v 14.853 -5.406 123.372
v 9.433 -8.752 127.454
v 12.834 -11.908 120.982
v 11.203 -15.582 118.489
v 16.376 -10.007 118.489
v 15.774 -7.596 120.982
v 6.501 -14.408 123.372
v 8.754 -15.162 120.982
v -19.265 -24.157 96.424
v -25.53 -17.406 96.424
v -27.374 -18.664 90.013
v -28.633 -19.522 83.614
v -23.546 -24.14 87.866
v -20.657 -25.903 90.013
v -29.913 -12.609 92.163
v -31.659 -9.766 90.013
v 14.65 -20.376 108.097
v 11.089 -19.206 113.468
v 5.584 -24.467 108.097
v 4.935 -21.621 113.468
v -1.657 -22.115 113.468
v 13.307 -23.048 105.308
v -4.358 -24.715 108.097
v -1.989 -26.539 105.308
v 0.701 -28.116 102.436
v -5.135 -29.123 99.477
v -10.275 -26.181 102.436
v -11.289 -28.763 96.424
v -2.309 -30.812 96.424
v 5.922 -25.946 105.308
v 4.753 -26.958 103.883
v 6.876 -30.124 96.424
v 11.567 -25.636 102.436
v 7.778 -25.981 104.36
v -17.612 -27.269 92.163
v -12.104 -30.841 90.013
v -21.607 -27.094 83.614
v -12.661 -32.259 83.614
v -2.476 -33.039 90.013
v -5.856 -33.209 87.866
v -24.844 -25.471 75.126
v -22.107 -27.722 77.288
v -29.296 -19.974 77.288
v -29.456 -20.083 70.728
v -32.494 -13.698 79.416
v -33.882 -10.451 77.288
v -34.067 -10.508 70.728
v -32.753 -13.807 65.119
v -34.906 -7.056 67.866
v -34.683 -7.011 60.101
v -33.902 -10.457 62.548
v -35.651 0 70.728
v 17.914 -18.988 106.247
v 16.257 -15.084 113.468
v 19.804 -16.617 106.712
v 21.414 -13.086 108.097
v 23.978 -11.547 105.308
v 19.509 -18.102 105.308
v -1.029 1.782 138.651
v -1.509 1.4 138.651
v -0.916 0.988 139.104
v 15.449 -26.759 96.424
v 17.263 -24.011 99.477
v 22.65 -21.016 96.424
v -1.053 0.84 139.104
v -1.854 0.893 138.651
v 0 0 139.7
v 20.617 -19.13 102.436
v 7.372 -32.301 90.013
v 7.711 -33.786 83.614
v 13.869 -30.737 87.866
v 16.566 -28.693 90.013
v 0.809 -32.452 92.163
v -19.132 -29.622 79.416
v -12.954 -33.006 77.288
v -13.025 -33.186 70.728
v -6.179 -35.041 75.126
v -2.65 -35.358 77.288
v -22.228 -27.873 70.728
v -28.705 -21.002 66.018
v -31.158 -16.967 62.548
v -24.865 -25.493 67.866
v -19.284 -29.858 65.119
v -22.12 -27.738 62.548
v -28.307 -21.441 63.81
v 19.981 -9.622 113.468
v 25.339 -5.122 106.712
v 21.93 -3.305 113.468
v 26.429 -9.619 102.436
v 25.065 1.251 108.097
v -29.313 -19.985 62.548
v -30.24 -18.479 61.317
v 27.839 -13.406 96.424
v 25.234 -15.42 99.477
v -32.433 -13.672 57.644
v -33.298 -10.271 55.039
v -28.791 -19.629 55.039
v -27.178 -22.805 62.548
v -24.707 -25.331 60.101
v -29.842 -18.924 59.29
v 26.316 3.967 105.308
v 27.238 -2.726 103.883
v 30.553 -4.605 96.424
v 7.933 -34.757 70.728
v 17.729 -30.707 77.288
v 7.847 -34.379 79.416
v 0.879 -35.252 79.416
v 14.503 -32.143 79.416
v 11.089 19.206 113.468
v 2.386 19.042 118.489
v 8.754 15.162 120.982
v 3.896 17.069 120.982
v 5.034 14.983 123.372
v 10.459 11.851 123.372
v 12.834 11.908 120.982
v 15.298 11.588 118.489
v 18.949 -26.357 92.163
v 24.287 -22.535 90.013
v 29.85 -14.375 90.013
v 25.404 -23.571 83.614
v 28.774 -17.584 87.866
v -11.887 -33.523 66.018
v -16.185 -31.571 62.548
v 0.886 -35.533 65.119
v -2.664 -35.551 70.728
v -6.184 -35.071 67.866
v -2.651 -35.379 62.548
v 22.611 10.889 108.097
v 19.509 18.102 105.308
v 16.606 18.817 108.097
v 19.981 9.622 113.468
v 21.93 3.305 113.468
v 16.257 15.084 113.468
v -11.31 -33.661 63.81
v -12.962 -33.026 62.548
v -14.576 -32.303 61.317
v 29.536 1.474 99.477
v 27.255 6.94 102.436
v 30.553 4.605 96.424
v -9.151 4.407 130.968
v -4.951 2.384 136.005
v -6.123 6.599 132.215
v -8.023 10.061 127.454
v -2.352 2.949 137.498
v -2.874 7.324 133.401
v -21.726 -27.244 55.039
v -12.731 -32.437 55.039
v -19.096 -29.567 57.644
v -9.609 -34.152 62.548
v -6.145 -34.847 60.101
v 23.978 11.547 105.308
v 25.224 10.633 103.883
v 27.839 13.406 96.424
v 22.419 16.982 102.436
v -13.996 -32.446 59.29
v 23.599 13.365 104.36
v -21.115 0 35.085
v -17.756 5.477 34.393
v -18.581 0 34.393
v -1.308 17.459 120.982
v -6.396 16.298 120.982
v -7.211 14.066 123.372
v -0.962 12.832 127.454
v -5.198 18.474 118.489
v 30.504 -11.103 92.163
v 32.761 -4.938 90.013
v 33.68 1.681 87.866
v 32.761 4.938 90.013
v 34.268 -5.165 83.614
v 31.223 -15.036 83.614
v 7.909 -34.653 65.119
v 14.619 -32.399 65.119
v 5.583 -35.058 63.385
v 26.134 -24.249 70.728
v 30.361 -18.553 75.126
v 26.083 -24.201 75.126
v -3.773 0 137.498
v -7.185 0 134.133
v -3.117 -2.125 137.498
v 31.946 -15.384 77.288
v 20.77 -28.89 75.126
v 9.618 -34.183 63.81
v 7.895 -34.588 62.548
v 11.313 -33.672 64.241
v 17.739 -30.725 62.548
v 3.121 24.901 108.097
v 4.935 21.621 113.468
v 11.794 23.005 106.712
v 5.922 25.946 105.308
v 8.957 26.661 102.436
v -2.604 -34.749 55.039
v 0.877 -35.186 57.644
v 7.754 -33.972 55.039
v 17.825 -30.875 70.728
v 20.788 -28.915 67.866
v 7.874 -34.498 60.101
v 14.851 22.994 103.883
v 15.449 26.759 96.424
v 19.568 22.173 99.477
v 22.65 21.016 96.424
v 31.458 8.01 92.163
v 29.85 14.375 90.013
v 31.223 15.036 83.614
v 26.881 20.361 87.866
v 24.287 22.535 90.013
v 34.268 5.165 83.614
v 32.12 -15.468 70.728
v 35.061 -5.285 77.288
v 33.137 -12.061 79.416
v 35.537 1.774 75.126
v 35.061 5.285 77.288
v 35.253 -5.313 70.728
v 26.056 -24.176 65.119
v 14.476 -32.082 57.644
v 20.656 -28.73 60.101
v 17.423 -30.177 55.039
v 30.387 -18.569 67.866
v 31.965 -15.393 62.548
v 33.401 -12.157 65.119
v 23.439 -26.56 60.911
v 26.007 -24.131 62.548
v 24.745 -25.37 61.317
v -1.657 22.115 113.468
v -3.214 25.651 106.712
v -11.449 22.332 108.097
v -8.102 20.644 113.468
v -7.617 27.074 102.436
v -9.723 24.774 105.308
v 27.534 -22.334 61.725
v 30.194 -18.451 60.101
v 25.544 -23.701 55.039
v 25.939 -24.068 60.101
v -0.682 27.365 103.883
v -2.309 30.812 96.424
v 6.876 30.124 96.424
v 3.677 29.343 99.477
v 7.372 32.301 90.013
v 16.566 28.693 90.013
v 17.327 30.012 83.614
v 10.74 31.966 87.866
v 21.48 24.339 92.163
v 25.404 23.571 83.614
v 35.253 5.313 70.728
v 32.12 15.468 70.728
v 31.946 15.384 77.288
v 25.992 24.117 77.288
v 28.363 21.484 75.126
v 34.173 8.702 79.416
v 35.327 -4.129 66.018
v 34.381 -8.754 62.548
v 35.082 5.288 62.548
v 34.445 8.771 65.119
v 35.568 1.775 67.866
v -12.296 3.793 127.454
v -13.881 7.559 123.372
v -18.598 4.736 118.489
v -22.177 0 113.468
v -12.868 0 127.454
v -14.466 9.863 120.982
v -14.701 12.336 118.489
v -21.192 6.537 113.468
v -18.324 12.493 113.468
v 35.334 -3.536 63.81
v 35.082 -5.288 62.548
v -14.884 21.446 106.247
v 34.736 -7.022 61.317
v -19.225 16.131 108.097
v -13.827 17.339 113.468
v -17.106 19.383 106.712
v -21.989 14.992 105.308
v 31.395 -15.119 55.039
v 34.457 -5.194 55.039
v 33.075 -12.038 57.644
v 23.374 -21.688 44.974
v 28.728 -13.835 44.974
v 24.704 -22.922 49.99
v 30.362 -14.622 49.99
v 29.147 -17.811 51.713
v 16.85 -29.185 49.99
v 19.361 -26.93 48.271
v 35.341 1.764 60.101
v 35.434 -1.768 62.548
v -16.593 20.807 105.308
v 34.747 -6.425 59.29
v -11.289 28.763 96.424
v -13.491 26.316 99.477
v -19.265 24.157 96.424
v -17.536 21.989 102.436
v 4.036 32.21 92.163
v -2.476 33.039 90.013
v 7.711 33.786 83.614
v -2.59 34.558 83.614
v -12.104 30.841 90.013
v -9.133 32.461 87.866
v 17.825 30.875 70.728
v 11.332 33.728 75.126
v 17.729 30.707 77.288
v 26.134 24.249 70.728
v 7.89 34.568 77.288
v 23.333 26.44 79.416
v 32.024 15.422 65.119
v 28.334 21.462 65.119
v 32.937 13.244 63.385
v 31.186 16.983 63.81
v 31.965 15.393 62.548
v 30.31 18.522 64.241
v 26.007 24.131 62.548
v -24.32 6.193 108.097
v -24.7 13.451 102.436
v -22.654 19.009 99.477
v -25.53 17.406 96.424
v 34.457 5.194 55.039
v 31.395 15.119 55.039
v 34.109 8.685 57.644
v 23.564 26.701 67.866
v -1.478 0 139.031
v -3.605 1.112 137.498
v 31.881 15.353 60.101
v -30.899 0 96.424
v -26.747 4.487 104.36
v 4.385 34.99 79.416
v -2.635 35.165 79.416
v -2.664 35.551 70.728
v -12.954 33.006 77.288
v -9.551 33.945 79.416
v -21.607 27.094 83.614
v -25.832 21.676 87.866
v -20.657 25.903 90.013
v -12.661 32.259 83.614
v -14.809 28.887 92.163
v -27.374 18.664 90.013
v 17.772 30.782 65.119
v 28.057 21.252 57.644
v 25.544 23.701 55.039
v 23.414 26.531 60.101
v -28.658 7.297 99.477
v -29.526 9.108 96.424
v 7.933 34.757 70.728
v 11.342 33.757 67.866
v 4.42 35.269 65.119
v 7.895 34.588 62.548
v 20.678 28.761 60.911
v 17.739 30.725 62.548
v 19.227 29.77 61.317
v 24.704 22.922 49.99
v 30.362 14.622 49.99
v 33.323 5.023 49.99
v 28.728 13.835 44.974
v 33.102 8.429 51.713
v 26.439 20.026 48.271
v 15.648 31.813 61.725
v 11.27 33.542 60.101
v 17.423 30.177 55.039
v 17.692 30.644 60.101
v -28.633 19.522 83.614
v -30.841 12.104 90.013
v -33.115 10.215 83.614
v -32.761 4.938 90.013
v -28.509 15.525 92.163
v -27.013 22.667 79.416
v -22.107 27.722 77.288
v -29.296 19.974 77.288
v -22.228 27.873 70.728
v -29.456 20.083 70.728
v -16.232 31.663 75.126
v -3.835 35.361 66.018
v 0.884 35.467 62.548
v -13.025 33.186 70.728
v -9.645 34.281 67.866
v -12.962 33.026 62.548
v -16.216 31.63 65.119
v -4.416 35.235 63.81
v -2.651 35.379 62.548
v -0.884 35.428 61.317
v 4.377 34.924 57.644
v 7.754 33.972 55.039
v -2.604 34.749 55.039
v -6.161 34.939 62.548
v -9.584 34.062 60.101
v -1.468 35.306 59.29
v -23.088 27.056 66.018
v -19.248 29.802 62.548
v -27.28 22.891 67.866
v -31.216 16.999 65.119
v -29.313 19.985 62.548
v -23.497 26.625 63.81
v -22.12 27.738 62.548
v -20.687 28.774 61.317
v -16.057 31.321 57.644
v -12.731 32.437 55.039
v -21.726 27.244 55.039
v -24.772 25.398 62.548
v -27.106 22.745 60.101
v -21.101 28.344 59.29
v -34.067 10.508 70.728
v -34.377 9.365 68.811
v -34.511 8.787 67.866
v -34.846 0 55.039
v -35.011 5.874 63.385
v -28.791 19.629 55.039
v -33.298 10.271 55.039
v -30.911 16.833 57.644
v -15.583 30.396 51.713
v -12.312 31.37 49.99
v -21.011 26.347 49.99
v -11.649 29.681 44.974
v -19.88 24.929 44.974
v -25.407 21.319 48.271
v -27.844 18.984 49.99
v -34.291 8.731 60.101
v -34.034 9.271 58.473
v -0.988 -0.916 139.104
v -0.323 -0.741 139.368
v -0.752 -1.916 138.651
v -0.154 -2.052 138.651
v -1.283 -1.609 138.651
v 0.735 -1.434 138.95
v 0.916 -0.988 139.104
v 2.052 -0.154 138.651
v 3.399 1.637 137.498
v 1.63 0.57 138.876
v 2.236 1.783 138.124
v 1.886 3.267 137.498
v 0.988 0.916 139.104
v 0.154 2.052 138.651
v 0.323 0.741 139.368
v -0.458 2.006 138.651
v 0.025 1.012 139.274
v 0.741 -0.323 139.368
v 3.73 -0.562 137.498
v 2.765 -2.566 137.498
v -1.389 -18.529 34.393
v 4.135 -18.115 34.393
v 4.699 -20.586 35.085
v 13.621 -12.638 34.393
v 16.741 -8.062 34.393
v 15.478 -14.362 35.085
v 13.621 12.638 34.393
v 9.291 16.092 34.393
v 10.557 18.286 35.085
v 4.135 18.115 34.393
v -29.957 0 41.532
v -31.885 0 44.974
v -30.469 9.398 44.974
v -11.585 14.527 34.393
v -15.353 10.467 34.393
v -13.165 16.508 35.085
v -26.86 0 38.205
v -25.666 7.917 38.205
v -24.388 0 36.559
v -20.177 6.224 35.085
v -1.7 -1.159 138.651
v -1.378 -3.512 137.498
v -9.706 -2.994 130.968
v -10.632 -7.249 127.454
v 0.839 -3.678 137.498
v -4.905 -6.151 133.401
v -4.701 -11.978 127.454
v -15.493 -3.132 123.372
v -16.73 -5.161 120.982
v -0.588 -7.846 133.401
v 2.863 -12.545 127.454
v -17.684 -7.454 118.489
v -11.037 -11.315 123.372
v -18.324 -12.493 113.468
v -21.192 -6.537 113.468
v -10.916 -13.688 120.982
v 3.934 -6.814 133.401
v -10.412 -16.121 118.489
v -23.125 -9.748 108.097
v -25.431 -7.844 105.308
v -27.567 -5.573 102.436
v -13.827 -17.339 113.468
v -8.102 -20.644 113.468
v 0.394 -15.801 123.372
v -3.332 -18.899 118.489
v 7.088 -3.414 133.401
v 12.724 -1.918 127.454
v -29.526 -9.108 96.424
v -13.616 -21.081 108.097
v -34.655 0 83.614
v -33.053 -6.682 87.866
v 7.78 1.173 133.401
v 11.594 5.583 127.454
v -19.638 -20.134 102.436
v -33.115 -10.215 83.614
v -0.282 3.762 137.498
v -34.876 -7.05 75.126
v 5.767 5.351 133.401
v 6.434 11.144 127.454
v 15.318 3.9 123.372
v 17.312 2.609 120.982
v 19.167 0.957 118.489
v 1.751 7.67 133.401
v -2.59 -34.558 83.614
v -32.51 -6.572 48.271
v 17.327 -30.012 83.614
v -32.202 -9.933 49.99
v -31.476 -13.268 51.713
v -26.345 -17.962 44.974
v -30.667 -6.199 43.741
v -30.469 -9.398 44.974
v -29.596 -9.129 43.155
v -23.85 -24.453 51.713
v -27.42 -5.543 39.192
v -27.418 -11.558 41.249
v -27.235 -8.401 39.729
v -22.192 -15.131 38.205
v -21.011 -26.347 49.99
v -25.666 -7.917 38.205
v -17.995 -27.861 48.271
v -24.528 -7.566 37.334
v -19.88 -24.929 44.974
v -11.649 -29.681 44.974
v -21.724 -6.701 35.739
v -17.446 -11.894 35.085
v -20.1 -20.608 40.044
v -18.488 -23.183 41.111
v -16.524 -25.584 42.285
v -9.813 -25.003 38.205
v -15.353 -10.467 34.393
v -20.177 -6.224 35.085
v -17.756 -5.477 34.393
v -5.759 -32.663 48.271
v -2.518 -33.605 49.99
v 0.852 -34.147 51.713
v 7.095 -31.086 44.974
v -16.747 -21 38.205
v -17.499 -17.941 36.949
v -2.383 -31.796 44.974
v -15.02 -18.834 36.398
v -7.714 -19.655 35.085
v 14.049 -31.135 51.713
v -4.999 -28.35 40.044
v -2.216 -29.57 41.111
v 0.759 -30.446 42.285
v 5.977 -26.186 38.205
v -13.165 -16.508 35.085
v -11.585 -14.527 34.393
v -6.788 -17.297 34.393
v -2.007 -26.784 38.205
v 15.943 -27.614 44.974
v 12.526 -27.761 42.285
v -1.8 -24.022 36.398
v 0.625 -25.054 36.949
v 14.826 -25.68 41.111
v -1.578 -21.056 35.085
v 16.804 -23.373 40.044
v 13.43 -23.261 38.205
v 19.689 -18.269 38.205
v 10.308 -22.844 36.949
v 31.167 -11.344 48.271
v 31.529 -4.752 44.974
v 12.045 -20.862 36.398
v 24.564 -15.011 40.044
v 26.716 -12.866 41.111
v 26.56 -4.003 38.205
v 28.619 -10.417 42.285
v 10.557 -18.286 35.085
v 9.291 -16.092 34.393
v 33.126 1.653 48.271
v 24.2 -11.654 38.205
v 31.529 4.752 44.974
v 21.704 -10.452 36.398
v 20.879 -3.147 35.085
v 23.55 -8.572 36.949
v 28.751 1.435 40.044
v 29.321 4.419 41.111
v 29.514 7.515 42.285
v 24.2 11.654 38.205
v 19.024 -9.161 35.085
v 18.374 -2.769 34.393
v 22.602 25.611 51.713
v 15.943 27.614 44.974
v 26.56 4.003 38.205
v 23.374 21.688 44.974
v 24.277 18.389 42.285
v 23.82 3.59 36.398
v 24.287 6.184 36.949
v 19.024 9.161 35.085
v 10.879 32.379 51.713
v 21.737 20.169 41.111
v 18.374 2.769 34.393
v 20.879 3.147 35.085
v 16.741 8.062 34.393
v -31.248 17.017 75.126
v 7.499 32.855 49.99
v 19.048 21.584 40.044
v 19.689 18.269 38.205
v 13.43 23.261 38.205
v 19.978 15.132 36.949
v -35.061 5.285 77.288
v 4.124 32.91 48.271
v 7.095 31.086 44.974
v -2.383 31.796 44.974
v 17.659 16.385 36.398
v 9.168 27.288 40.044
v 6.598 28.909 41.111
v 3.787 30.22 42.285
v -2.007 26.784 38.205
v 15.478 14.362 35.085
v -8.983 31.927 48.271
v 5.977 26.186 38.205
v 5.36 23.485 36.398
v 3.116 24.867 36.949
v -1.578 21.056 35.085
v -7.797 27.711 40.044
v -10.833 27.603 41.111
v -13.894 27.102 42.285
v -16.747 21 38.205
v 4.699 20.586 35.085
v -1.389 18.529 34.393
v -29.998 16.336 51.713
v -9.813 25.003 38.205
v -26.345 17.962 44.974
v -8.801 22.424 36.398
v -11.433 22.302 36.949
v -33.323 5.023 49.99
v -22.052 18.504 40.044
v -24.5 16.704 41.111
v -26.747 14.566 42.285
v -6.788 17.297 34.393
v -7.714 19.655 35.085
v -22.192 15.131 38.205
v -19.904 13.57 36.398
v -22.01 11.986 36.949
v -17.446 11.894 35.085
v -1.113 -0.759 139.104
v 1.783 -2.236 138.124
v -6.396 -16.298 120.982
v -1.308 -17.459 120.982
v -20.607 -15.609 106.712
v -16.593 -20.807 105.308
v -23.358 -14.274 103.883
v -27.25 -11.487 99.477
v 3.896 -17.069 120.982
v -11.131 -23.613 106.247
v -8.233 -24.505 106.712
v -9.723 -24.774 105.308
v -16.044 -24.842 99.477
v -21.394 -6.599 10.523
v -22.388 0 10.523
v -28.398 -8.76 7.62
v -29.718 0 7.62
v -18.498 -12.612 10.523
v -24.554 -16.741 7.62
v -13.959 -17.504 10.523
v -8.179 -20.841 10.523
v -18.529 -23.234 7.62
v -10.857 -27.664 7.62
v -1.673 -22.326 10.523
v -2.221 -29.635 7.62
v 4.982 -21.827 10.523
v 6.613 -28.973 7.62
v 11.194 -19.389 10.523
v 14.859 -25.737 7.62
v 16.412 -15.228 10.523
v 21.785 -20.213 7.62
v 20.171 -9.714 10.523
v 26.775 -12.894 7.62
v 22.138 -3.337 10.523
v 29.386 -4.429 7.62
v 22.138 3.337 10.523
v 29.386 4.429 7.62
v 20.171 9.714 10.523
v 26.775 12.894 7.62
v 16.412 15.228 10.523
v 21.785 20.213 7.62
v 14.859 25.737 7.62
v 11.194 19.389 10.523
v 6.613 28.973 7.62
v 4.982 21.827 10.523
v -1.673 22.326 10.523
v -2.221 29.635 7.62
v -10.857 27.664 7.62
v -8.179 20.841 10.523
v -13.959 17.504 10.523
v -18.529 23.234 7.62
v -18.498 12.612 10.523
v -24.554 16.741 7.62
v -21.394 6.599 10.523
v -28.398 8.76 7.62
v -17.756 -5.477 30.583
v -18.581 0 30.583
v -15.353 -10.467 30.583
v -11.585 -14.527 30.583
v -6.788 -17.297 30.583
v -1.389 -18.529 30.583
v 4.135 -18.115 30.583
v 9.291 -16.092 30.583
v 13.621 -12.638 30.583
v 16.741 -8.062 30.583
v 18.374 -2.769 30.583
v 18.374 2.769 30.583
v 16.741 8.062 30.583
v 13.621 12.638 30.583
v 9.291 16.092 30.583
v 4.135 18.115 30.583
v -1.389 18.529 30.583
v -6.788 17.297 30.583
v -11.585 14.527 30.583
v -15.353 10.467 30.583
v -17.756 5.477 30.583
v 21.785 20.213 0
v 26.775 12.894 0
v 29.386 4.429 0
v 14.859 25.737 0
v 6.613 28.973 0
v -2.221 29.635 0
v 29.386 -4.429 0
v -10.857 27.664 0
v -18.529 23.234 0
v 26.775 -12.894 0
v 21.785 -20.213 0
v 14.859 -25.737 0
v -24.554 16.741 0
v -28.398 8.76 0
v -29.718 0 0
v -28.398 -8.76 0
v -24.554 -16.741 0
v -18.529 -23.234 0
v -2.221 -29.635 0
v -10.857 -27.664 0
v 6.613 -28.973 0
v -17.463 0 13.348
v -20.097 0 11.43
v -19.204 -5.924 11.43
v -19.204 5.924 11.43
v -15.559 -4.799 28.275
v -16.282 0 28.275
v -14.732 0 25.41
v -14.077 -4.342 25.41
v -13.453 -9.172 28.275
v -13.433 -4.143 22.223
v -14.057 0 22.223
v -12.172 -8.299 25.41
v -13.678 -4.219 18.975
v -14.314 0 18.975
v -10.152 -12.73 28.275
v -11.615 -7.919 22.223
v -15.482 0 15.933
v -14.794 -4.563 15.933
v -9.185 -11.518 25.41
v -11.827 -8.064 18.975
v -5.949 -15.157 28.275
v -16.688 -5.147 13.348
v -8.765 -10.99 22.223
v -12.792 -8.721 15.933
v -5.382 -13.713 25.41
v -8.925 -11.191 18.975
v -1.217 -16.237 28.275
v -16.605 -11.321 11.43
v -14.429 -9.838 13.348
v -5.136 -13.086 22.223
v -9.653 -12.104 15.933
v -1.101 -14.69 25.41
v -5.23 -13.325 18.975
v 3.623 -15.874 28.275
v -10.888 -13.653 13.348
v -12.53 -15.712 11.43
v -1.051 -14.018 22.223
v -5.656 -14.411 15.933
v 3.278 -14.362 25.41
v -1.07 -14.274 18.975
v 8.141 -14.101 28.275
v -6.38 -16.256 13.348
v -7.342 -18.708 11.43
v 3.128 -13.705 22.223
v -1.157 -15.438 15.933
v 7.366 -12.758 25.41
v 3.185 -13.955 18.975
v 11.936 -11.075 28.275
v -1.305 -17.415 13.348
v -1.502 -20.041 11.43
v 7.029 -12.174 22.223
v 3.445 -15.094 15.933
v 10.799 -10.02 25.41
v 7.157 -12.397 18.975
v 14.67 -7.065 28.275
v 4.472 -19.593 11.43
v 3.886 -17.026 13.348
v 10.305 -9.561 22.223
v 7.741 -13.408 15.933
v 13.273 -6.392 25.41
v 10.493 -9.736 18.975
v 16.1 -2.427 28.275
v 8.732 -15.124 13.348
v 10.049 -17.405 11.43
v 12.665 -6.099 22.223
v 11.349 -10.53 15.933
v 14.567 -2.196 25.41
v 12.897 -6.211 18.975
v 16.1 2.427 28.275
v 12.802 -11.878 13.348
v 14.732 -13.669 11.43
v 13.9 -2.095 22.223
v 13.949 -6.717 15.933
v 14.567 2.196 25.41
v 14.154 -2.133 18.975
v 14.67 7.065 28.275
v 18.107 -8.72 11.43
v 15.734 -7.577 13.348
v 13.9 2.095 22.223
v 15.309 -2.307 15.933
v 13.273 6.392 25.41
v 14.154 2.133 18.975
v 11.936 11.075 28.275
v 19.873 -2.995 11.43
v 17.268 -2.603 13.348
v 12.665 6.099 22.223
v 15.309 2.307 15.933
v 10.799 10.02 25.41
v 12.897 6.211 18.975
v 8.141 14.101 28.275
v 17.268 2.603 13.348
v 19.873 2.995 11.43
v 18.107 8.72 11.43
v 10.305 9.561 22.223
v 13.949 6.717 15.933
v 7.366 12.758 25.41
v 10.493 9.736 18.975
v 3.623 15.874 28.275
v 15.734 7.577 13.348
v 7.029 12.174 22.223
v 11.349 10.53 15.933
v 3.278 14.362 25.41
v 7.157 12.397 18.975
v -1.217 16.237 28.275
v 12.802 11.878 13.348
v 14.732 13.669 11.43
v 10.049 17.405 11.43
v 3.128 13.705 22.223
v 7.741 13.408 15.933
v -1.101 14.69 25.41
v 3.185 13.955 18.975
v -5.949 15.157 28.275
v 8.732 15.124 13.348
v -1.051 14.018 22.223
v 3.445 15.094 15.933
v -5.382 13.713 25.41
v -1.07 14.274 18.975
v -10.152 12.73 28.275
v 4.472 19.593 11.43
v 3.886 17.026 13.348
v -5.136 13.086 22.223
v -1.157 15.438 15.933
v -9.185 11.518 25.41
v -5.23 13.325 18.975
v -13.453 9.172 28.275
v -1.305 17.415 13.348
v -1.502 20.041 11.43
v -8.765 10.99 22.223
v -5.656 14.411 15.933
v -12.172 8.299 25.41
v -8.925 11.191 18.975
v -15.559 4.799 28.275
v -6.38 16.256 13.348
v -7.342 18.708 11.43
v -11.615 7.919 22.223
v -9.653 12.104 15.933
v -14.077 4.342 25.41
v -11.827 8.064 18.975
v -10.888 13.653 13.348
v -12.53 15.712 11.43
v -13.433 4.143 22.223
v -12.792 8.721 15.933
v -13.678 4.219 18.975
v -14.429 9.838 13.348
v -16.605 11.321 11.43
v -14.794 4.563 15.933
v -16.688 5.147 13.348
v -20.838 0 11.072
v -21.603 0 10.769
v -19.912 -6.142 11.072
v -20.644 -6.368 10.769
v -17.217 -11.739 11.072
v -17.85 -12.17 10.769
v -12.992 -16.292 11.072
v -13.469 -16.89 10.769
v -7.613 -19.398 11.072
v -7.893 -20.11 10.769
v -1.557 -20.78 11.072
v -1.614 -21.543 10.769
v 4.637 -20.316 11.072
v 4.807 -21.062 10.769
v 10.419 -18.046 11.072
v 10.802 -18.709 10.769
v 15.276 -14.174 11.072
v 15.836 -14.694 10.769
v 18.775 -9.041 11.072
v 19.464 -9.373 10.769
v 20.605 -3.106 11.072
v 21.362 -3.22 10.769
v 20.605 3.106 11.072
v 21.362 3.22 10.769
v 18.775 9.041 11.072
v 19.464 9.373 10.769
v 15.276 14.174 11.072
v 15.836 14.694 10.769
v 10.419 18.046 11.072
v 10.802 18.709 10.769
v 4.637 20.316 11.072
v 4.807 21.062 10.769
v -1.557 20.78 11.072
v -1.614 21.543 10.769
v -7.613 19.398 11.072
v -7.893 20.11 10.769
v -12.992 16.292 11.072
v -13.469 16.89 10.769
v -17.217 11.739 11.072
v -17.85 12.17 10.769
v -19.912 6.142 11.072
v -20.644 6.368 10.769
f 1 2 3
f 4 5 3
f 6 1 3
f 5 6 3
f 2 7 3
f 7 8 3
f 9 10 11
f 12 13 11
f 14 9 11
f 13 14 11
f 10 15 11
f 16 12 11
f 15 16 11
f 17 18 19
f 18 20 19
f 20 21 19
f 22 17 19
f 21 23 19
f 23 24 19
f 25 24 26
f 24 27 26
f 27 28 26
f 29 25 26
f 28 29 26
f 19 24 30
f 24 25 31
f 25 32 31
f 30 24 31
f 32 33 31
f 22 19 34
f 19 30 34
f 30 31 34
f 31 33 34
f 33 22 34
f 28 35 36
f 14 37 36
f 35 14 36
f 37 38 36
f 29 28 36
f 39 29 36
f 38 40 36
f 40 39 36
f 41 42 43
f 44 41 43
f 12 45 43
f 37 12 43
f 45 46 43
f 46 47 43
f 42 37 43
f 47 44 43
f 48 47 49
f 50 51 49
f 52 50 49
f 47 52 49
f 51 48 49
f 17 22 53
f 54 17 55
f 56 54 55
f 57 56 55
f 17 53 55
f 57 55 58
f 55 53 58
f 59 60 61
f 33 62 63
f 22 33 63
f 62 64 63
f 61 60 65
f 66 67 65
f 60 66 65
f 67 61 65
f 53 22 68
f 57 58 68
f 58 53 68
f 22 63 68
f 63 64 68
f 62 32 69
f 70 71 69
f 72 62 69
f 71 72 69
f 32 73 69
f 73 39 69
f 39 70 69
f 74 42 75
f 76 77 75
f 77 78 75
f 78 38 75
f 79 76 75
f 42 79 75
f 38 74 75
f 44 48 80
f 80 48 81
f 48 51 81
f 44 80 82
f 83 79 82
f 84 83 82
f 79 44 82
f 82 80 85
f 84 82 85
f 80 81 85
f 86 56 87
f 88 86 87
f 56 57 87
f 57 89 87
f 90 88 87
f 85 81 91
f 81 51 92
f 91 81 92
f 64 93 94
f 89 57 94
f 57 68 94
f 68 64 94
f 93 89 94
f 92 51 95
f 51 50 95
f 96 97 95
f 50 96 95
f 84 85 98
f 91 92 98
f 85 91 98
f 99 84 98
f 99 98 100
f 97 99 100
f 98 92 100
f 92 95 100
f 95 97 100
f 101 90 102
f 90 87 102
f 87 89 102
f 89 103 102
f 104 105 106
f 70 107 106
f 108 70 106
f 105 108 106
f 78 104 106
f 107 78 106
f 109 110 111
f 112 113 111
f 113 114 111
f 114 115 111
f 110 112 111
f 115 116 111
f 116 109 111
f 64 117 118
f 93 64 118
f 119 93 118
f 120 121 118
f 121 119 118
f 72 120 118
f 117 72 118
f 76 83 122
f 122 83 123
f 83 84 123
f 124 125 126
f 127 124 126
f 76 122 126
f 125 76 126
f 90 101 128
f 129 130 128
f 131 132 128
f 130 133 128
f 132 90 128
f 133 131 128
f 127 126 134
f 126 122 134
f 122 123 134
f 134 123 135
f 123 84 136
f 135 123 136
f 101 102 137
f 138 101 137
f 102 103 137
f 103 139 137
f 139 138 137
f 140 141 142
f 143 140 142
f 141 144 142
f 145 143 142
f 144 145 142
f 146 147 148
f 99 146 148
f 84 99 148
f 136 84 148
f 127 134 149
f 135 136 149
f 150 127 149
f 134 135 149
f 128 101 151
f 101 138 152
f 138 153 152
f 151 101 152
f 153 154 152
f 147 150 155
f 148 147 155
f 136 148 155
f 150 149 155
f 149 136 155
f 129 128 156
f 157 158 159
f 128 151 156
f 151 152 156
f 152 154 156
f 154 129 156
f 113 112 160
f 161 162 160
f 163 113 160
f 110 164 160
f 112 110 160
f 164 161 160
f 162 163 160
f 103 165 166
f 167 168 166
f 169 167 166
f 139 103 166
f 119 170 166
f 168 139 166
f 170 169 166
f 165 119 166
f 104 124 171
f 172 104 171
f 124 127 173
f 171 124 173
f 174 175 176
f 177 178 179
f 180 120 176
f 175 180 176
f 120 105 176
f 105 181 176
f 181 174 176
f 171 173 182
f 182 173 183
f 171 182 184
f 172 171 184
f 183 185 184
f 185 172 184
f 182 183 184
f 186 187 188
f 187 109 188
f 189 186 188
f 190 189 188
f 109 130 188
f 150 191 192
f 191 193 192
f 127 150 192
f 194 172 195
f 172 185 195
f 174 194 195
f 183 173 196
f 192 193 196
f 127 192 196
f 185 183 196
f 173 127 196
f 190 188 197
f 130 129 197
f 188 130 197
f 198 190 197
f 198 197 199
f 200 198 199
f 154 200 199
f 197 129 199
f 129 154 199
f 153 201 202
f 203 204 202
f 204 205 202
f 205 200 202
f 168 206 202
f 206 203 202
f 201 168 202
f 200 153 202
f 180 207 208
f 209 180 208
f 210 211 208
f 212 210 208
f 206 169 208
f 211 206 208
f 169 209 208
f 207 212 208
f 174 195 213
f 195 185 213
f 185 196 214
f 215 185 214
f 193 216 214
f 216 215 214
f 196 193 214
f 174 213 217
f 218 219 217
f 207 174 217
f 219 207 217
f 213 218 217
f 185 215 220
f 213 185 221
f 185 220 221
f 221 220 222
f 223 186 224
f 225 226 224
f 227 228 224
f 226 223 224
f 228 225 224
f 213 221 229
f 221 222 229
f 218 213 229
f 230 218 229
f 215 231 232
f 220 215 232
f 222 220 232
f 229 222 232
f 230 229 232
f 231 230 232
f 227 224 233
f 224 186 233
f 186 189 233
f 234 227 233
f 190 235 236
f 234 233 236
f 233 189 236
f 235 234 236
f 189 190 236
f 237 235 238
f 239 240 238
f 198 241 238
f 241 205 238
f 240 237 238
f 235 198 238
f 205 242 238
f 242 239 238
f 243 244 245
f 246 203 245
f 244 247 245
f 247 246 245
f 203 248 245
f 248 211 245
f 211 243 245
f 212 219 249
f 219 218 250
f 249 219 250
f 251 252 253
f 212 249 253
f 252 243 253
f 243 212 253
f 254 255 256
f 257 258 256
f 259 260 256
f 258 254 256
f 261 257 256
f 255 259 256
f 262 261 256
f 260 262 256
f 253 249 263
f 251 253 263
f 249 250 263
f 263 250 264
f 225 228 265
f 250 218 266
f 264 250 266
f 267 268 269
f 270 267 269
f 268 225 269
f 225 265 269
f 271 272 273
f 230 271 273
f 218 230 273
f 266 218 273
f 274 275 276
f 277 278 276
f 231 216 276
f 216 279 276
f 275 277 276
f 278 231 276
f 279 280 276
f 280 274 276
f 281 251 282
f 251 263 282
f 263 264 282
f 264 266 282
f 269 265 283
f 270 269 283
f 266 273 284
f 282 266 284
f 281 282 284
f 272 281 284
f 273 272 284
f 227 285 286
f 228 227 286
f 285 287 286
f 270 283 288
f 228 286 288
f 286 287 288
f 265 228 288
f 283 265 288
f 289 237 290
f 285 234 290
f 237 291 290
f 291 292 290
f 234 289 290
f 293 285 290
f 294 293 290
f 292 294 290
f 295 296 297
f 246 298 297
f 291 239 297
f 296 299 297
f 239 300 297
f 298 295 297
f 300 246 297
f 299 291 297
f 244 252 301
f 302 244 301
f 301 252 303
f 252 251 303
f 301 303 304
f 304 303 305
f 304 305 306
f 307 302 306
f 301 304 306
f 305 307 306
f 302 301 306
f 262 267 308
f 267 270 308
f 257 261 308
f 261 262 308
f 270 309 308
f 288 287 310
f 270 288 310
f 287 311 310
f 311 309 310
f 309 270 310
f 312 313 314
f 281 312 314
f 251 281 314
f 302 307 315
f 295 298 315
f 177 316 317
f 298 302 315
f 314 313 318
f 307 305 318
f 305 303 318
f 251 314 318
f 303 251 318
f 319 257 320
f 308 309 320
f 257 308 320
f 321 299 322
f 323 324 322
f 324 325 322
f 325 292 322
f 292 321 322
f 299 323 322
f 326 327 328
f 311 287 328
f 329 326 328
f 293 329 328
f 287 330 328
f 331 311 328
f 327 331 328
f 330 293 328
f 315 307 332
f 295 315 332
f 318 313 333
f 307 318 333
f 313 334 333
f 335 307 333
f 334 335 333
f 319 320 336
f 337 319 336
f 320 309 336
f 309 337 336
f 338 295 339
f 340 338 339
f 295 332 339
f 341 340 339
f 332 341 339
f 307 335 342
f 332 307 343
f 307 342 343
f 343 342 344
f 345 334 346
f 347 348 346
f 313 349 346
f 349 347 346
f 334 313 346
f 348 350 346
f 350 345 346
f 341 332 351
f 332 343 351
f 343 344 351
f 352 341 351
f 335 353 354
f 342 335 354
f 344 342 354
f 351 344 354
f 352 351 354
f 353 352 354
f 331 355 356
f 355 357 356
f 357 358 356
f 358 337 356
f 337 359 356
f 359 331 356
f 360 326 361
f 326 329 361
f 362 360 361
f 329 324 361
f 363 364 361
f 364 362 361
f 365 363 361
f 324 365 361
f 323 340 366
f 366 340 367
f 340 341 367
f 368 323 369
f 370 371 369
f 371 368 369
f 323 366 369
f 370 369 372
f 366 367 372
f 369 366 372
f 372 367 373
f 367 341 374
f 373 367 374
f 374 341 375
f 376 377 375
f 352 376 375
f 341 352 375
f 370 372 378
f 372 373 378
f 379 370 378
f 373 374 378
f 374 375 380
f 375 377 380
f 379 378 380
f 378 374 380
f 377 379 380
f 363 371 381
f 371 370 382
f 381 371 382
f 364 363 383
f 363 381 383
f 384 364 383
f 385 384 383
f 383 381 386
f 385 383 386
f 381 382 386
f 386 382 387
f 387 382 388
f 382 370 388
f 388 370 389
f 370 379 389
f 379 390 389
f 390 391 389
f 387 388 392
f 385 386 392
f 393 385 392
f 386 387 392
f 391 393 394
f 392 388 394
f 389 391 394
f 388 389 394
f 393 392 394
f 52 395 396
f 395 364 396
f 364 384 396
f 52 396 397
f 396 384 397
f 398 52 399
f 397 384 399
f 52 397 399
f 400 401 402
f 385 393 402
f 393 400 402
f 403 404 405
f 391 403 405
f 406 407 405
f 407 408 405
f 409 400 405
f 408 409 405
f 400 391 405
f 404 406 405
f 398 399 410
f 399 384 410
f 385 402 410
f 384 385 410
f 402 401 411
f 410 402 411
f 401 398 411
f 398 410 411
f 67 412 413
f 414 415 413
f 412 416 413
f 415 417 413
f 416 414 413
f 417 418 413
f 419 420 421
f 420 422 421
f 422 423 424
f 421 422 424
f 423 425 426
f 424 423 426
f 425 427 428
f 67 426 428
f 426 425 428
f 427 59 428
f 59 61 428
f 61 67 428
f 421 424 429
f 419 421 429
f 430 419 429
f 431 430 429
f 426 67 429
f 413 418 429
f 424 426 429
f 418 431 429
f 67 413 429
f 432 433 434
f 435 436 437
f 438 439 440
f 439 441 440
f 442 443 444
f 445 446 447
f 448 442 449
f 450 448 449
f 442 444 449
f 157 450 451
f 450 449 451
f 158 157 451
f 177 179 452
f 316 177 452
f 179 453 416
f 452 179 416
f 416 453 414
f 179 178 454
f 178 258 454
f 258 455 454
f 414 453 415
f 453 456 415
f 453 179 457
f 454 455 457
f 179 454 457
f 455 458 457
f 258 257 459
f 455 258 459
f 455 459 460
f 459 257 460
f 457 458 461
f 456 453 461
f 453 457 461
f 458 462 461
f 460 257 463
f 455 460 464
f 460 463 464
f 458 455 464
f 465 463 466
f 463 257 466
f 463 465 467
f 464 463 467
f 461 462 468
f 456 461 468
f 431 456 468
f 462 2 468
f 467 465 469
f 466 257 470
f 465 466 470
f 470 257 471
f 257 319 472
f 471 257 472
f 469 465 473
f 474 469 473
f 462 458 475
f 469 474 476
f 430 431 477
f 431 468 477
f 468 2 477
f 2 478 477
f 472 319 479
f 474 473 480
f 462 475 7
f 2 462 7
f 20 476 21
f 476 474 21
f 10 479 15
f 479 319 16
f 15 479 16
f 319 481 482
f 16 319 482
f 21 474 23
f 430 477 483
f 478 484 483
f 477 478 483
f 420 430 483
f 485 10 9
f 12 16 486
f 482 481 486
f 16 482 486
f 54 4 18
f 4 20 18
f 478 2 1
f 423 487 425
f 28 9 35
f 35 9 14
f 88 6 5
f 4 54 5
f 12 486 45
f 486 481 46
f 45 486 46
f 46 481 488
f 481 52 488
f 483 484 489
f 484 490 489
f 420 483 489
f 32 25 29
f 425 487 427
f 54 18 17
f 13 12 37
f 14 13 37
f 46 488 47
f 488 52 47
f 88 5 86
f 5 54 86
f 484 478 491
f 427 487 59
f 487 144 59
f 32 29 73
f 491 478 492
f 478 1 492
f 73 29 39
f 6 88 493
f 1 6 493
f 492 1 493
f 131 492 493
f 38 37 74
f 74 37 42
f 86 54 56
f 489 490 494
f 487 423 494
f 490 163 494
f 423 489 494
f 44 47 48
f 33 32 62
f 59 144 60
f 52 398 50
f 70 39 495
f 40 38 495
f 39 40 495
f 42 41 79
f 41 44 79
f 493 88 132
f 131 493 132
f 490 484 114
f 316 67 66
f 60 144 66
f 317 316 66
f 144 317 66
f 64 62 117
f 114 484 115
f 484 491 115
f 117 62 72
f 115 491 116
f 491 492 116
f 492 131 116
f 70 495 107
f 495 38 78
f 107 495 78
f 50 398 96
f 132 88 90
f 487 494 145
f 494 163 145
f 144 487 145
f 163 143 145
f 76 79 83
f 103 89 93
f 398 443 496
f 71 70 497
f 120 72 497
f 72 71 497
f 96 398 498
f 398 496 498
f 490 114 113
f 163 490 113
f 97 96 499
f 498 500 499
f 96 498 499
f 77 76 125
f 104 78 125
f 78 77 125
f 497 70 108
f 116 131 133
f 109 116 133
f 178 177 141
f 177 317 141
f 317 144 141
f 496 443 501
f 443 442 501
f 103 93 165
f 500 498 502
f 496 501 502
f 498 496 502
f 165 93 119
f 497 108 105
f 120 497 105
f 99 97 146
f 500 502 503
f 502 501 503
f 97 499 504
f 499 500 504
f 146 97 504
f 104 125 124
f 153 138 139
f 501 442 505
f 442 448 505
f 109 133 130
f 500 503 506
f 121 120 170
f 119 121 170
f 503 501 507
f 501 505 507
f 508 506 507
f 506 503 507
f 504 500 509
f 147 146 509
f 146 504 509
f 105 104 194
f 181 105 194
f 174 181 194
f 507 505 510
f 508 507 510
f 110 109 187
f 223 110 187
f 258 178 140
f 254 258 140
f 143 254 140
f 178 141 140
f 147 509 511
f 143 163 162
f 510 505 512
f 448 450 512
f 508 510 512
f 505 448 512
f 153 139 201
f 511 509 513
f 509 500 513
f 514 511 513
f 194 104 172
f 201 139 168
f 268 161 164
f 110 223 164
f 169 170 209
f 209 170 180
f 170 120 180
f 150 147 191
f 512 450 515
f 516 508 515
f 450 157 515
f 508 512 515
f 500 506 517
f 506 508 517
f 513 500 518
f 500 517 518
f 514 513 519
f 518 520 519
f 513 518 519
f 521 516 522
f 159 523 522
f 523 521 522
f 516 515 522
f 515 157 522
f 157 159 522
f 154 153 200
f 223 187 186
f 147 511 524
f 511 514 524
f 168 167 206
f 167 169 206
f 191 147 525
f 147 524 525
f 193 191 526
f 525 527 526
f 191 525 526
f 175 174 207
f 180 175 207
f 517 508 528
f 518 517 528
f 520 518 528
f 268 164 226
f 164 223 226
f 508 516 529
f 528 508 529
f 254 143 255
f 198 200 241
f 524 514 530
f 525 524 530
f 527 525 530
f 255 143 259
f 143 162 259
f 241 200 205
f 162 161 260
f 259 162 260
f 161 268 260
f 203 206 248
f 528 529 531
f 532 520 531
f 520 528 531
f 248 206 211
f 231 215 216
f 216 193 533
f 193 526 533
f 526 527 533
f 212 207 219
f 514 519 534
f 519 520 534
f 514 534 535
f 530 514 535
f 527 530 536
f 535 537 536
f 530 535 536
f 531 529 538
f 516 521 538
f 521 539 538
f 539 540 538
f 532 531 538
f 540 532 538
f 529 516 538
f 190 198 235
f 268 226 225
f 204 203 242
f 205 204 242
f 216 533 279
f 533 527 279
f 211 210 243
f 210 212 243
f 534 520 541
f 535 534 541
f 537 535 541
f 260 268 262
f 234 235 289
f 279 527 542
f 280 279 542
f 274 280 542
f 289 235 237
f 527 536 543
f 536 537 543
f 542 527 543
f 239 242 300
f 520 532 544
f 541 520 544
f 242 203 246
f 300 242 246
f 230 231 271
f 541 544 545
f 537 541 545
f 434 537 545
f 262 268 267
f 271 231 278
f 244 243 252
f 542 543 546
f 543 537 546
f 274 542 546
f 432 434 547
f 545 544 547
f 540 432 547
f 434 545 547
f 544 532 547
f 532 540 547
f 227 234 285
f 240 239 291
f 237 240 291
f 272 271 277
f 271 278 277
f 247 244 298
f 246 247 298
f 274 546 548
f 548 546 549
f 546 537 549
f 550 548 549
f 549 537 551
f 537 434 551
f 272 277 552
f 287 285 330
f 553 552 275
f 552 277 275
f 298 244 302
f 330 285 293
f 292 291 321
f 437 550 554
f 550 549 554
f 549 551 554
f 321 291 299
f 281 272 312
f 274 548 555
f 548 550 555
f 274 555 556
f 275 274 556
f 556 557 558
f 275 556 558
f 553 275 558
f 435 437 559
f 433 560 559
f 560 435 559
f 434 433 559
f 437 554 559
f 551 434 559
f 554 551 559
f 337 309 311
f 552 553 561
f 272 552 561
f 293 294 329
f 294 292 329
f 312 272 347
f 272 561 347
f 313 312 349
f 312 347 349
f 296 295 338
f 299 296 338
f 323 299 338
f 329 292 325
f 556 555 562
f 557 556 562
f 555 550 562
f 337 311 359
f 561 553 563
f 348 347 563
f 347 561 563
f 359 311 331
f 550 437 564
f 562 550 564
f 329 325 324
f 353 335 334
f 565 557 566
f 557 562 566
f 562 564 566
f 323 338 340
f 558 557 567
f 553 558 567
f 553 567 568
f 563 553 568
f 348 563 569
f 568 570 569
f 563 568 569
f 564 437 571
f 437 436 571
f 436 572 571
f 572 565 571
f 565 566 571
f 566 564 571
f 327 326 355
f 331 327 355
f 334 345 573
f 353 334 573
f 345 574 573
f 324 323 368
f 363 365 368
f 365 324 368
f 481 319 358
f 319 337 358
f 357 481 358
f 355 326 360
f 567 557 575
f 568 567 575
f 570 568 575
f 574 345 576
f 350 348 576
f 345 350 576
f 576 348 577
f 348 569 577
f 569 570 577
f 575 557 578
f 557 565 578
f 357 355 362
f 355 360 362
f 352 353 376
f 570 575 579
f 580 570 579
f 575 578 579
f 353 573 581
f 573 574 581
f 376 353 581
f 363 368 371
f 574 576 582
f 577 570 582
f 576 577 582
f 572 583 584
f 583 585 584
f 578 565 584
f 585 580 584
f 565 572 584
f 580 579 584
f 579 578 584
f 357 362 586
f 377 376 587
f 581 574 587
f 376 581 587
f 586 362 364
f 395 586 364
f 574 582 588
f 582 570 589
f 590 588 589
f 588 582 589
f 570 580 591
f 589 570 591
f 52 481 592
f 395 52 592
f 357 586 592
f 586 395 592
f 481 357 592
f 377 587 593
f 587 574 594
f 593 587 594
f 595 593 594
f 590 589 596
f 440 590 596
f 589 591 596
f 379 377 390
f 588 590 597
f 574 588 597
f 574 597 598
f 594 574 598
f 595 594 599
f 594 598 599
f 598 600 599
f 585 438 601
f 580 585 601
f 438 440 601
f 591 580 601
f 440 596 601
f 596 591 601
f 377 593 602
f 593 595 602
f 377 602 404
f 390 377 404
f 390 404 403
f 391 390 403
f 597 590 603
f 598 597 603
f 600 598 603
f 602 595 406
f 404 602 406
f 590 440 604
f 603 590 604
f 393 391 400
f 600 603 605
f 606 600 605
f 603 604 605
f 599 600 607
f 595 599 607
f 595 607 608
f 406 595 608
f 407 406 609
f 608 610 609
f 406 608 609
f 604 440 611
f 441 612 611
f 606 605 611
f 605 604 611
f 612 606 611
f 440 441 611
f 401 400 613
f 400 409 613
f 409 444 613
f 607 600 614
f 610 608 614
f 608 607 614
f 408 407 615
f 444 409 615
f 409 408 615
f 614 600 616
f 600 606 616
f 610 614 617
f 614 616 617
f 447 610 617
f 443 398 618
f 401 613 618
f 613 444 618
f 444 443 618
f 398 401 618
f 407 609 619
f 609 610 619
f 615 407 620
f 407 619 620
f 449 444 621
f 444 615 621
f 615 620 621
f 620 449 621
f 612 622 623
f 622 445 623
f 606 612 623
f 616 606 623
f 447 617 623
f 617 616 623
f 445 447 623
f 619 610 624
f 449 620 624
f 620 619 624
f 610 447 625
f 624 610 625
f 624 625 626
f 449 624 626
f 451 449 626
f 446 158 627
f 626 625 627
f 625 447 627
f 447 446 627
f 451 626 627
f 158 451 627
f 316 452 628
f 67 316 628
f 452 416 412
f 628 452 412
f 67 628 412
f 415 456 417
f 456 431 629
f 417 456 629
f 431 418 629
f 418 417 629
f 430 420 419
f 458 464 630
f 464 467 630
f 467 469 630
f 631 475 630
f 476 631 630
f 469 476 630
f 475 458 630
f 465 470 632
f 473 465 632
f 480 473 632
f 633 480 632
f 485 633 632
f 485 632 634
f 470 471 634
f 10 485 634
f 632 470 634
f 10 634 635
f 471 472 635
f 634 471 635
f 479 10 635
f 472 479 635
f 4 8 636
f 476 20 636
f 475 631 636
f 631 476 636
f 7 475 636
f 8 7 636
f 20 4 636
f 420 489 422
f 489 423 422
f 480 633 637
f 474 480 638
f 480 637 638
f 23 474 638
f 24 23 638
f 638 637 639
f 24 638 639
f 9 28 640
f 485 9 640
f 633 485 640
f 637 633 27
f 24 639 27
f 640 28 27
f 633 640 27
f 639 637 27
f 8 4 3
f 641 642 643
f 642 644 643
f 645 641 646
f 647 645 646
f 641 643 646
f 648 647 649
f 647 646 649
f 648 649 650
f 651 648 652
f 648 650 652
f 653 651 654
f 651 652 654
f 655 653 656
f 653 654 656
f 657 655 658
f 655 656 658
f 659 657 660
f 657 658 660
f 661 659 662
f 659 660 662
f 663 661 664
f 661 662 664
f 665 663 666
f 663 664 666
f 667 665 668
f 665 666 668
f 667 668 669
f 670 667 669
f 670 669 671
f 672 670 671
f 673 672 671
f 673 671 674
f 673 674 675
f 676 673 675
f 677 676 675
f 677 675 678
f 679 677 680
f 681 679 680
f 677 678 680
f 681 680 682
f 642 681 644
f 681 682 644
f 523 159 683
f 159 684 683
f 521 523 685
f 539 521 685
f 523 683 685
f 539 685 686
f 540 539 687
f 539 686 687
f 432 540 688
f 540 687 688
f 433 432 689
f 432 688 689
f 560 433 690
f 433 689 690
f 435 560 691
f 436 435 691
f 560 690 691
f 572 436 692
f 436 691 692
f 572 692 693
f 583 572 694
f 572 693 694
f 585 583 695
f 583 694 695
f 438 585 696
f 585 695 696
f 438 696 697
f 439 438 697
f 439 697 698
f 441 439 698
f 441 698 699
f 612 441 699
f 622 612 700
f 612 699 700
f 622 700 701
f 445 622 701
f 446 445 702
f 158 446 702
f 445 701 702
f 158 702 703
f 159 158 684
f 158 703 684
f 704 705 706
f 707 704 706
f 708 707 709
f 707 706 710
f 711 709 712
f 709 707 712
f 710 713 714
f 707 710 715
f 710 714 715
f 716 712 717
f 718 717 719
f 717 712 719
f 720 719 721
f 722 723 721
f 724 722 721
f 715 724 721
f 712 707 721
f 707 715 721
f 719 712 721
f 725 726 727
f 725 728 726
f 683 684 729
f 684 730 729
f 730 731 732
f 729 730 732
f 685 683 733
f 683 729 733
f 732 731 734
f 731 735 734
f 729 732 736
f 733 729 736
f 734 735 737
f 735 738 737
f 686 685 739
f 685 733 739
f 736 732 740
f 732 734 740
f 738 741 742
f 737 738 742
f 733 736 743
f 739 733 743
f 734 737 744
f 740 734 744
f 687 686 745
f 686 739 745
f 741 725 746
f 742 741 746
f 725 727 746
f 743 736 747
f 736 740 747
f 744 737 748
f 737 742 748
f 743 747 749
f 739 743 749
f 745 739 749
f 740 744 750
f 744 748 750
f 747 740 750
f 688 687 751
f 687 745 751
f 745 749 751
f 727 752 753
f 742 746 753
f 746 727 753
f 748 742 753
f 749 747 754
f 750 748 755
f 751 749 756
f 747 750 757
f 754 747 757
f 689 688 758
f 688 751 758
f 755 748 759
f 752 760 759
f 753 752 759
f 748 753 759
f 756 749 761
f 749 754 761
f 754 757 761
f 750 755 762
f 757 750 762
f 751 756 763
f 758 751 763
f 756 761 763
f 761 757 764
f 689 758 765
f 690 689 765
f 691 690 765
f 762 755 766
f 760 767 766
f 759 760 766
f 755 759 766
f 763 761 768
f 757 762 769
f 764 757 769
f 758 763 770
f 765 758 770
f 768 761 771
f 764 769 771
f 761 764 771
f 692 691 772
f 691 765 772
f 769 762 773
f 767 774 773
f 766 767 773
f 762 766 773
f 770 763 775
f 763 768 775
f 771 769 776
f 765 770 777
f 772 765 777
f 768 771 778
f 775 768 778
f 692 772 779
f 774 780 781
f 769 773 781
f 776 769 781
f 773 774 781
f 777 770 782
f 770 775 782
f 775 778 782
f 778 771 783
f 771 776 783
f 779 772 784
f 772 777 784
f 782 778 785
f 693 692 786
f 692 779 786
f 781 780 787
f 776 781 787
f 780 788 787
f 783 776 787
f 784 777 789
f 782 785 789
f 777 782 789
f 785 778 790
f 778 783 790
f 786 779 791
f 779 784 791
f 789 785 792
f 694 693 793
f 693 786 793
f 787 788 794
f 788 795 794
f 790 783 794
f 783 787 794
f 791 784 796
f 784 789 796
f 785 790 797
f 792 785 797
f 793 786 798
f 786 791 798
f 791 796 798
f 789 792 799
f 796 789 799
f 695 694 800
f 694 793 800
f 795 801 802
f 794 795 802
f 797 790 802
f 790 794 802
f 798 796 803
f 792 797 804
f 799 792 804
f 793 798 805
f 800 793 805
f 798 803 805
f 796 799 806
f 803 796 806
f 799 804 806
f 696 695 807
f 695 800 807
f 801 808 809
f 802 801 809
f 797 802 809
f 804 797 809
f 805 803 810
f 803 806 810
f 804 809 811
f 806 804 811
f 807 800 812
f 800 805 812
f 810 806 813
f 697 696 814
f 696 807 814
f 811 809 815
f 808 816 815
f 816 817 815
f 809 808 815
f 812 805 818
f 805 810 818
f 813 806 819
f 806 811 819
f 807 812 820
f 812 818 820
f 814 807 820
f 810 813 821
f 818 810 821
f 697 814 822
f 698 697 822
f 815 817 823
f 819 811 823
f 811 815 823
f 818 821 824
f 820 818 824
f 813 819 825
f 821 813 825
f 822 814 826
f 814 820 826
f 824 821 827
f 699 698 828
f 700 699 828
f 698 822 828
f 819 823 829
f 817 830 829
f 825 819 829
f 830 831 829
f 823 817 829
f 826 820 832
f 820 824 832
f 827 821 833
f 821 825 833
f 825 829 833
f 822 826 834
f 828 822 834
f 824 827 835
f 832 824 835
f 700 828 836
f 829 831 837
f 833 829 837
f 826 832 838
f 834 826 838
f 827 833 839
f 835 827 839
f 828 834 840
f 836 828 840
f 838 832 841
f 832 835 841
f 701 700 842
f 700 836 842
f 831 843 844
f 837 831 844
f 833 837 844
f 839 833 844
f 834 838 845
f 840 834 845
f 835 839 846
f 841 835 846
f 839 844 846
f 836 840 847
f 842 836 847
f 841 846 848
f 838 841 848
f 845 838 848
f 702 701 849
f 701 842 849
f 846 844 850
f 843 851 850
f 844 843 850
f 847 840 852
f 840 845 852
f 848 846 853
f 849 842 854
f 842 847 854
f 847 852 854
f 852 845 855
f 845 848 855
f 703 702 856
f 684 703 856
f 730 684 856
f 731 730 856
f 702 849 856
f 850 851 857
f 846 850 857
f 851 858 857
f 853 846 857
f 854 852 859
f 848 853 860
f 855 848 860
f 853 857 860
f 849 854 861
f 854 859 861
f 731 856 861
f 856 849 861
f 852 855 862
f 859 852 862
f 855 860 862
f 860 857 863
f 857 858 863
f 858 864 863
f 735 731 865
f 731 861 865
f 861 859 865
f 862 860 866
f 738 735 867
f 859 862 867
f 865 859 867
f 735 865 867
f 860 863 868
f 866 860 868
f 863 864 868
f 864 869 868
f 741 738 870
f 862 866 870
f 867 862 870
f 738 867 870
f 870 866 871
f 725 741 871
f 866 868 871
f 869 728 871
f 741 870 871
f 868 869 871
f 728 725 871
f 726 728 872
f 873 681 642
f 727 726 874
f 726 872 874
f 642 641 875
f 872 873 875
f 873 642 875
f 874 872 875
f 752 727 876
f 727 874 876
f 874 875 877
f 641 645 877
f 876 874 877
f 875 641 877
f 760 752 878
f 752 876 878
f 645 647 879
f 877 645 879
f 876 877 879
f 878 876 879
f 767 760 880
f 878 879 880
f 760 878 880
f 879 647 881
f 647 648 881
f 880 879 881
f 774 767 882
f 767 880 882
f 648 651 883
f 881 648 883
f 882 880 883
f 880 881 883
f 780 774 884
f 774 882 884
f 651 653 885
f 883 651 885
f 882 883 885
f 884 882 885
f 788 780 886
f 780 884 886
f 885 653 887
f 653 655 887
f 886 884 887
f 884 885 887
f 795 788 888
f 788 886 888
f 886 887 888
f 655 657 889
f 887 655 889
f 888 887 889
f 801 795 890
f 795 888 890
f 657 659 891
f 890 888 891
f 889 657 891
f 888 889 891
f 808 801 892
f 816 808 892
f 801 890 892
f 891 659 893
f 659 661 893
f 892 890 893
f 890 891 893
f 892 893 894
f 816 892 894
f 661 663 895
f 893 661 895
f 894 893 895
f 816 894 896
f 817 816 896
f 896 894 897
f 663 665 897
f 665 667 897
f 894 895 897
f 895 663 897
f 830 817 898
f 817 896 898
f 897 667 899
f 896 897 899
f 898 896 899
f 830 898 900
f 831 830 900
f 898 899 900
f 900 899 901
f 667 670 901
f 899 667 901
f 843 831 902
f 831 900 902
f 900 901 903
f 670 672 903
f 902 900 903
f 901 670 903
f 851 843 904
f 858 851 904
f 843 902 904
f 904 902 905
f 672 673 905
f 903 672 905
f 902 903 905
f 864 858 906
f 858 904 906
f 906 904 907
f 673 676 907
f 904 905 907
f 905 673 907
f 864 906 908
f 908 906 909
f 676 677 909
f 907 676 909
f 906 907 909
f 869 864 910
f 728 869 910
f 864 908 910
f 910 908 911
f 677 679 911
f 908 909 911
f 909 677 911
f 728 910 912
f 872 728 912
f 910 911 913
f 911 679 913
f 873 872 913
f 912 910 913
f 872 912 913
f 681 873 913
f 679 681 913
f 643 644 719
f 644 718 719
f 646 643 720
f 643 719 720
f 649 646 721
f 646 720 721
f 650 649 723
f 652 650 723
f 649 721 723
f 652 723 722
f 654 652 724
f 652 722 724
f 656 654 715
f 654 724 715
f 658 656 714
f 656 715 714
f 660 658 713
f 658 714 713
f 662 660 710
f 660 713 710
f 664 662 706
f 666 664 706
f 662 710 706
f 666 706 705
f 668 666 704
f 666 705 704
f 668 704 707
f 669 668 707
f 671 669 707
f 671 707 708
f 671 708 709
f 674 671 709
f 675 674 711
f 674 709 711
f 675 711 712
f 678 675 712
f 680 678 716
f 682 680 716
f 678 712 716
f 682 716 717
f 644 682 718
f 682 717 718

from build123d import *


with BuildPart() as f1:
    # F0 (on Front) → F1 (revolve)
    with BuildSketch(Plane.XZ):
        with BuildLine():
            Line((-29.718, 0), (0, 0))
            Line((0, 0), (0, 139.7))
            add(Edge.make_bspline(
                [(0, 139.7), (-1.332890031, 139.1882715151), (-1.8603837673, 138.7430204991), (-3.738553409, 137.5889104722), (-5.5119074264, 136.0998578475), (-7.3092610972, 133.8932217358), (-10.8605513992, 130.411160203), (-13.7142621765, 126.1493057597), (-19.8421300006, 118.0126681069), (-24.5523638064, 108.9685204818), (-30.3712789483, 98.6494156699), (-34.3429286118, 86.895270118), (-35.8827669877, 75.7913836252), (-35.485996244, 64.0177325252), (-35.3495954504, 55.2409768629), (-31.7641647583, 42.6108824886), (-25.514862995, 36.4842456962), (-19.8051602282, 34.5467560758), (-18.5812036089, 34.3930916695)],
                knots=[0, 0, 0, 0, 0.0357723298, 0.0678639681, 0.1033114242, 0.1427641876, 0.1939418386, 0.247423772, 0.3211937059, 0.3968212146, 0.4771292725, 0.5591971953, 0.6379204232, 0.7170222096, 0.787354561, 0.8703074135, 0.9404479598, 1, 1, 1, 1], degree=3))
            Line((-18.5812036089, 34.3930916695), (-18.5812036089, 30.5830916695))
            ThreePointArc((-18.5812036089, 30.5830916695), (-14.0689467041, 20.5894479355), (-20.0970385226, 11.43))
            ThreePointArc((-20.0970385226, 11.43), (-21.2180602155, 10.9140424703), (-22.3883914024, 10.5226006208))
            Line((-22.3883914024, 10.5226006208), (-29.718, 7.62))
            Line((-29.718, 7.62), (-29.718, 0))
        make_face()
    revolve(axis=Axis((0, 0, 69.85), (0, 0, 1)))


solid = f1.part
